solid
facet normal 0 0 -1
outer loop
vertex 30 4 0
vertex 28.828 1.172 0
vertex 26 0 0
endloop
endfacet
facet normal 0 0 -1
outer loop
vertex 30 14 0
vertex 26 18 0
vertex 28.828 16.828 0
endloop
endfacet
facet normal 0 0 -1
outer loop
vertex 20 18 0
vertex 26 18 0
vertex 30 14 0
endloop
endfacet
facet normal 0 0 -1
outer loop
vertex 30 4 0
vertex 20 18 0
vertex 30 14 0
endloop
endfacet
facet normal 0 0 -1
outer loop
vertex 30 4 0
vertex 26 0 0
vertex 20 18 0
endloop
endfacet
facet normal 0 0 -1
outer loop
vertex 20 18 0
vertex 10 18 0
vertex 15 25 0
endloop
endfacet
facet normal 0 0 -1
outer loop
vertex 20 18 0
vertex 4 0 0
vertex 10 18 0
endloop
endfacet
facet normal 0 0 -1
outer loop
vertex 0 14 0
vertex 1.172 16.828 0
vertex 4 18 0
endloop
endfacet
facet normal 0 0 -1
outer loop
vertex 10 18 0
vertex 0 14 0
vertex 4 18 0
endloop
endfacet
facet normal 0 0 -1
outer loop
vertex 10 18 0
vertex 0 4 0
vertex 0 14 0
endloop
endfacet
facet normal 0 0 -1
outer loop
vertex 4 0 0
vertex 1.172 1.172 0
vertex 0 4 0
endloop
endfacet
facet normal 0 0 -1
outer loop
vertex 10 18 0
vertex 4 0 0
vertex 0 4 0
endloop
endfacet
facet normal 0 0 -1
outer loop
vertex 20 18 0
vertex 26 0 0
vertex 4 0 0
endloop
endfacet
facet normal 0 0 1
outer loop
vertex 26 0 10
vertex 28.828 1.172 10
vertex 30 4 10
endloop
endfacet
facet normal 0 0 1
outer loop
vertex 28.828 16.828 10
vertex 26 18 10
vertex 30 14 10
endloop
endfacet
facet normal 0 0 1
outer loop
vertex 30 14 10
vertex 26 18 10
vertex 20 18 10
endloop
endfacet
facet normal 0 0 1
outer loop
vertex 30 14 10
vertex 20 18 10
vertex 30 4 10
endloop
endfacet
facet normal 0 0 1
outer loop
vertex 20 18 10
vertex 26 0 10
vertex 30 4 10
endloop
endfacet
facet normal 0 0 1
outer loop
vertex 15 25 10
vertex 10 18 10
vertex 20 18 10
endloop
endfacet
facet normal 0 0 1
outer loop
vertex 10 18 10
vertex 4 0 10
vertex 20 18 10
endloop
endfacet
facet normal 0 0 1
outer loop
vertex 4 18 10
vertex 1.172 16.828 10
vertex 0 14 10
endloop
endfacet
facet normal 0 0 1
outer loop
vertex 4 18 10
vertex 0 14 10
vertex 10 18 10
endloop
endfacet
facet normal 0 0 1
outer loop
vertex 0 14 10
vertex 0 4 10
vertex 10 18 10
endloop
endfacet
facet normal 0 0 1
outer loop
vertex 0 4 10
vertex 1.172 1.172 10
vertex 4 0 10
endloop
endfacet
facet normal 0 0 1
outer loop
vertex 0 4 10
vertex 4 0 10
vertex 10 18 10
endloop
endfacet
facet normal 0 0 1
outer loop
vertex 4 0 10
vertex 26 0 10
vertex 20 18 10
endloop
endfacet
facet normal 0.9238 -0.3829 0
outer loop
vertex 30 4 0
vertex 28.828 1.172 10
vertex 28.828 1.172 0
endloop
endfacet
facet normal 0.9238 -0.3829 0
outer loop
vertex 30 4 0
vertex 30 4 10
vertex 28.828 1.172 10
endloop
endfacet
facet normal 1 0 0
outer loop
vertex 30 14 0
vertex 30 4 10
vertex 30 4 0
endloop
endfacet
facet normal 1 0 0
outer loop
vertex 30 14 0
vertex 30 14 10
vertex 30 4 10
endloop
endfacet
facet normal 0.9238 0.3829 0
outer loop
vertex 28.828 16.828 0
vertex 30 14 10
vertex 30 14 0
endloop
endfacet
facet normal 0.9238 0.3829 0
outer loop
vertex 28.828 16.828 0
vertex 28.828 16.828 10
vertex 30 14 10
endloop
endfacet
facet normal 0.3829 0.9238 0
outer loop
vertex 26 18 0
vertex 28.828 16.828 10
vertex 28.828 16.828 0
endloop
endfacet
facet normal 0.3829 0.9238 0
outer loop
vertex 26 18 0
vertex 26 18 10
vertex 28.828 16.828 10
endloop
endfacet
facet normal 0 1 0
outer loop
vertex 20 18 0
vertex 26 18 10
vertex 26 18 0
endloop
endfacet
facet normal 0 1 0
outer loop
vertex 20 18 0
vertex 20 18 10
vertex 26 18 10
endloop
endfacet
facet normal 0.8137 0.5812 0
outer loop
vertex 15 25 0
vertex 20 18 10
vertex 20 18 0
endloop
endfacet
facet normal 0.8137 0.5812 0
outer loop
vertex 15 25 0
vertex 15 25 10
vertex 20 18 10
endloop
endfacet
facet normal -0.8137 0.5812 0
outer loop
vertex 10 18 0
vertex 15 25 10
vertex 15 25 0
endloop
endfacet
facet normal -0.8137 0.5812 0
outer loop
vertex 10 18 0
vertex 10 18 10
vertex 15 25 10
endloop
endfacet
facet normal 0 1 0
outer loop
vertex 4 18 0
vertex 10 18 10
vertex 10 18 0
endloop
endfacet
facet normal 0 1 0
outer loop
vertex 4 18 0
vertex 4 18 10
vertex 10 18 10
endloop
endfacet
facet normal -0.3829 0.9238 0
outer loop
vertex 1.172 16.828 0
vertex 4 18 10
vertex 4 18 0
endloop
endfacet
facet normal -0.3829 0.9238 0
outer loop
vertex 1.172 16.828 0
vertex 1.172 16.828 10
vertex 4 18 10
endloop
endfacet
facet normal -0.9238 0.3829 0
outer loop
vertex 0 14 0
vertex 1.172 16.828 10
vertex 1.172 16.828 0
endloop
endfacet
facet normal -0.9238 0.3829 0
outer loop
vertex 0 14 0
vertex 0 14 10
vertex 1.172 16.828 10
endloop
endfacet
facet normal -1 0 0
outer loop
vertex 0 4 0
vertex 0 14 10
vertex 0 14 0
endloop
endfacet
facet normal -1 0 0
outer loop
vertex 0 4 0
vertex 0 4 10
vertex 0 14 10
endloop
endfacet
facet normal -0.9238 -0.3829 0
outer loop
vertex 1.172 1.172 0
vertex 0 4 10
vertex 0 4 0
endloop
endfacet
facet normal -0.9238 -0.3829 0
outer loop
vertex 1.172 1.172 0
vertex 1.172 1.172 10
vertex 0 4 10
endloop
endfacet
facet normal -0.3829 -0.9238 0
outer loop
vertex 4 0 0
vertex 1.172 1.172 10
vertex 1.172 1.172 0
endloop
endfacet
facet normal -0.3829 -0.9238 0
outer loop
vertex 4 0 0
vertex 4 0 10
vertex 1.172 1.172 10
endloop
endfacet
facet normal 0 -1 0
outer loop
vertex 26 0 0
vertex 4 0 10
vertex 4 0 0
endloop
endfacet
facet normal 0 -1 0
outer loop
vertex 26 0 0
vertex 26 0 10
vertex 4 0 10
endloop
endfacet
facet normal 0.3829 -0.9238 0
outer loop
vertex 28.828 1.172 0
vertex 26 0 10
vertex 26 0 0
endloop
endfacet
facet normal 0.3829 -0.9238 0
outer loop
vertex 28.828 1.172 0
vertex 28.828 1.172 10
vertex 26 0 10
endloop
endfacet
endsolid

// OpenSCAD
$fn = 32;

// ----------------------------------------------------------------------
// Ratchet pawl: 30 x 18 mm body, beak 7 mm сверху
// ----------------------------------------------------------------------

// --- parameters (mm) ---
profile_height = 10;      // extrusion height
profile_points = 15;      // points of the closed outline

profile = [[0, 4], [1.172, 1.172], [4, 0], [26, 0], [28.828, 1.172], [30, 4], [30, 14], [28.828, 16.828], [26, 18], [20, 18], [15, 25], [10, 18], [4, 18], [1.172, 16.828], [0, 14]];  // single closed polygon, 15 points, counter clockwise

// --- the one profile operation ---
linear_extrude(height = profile_height) polygon(points = profile);
